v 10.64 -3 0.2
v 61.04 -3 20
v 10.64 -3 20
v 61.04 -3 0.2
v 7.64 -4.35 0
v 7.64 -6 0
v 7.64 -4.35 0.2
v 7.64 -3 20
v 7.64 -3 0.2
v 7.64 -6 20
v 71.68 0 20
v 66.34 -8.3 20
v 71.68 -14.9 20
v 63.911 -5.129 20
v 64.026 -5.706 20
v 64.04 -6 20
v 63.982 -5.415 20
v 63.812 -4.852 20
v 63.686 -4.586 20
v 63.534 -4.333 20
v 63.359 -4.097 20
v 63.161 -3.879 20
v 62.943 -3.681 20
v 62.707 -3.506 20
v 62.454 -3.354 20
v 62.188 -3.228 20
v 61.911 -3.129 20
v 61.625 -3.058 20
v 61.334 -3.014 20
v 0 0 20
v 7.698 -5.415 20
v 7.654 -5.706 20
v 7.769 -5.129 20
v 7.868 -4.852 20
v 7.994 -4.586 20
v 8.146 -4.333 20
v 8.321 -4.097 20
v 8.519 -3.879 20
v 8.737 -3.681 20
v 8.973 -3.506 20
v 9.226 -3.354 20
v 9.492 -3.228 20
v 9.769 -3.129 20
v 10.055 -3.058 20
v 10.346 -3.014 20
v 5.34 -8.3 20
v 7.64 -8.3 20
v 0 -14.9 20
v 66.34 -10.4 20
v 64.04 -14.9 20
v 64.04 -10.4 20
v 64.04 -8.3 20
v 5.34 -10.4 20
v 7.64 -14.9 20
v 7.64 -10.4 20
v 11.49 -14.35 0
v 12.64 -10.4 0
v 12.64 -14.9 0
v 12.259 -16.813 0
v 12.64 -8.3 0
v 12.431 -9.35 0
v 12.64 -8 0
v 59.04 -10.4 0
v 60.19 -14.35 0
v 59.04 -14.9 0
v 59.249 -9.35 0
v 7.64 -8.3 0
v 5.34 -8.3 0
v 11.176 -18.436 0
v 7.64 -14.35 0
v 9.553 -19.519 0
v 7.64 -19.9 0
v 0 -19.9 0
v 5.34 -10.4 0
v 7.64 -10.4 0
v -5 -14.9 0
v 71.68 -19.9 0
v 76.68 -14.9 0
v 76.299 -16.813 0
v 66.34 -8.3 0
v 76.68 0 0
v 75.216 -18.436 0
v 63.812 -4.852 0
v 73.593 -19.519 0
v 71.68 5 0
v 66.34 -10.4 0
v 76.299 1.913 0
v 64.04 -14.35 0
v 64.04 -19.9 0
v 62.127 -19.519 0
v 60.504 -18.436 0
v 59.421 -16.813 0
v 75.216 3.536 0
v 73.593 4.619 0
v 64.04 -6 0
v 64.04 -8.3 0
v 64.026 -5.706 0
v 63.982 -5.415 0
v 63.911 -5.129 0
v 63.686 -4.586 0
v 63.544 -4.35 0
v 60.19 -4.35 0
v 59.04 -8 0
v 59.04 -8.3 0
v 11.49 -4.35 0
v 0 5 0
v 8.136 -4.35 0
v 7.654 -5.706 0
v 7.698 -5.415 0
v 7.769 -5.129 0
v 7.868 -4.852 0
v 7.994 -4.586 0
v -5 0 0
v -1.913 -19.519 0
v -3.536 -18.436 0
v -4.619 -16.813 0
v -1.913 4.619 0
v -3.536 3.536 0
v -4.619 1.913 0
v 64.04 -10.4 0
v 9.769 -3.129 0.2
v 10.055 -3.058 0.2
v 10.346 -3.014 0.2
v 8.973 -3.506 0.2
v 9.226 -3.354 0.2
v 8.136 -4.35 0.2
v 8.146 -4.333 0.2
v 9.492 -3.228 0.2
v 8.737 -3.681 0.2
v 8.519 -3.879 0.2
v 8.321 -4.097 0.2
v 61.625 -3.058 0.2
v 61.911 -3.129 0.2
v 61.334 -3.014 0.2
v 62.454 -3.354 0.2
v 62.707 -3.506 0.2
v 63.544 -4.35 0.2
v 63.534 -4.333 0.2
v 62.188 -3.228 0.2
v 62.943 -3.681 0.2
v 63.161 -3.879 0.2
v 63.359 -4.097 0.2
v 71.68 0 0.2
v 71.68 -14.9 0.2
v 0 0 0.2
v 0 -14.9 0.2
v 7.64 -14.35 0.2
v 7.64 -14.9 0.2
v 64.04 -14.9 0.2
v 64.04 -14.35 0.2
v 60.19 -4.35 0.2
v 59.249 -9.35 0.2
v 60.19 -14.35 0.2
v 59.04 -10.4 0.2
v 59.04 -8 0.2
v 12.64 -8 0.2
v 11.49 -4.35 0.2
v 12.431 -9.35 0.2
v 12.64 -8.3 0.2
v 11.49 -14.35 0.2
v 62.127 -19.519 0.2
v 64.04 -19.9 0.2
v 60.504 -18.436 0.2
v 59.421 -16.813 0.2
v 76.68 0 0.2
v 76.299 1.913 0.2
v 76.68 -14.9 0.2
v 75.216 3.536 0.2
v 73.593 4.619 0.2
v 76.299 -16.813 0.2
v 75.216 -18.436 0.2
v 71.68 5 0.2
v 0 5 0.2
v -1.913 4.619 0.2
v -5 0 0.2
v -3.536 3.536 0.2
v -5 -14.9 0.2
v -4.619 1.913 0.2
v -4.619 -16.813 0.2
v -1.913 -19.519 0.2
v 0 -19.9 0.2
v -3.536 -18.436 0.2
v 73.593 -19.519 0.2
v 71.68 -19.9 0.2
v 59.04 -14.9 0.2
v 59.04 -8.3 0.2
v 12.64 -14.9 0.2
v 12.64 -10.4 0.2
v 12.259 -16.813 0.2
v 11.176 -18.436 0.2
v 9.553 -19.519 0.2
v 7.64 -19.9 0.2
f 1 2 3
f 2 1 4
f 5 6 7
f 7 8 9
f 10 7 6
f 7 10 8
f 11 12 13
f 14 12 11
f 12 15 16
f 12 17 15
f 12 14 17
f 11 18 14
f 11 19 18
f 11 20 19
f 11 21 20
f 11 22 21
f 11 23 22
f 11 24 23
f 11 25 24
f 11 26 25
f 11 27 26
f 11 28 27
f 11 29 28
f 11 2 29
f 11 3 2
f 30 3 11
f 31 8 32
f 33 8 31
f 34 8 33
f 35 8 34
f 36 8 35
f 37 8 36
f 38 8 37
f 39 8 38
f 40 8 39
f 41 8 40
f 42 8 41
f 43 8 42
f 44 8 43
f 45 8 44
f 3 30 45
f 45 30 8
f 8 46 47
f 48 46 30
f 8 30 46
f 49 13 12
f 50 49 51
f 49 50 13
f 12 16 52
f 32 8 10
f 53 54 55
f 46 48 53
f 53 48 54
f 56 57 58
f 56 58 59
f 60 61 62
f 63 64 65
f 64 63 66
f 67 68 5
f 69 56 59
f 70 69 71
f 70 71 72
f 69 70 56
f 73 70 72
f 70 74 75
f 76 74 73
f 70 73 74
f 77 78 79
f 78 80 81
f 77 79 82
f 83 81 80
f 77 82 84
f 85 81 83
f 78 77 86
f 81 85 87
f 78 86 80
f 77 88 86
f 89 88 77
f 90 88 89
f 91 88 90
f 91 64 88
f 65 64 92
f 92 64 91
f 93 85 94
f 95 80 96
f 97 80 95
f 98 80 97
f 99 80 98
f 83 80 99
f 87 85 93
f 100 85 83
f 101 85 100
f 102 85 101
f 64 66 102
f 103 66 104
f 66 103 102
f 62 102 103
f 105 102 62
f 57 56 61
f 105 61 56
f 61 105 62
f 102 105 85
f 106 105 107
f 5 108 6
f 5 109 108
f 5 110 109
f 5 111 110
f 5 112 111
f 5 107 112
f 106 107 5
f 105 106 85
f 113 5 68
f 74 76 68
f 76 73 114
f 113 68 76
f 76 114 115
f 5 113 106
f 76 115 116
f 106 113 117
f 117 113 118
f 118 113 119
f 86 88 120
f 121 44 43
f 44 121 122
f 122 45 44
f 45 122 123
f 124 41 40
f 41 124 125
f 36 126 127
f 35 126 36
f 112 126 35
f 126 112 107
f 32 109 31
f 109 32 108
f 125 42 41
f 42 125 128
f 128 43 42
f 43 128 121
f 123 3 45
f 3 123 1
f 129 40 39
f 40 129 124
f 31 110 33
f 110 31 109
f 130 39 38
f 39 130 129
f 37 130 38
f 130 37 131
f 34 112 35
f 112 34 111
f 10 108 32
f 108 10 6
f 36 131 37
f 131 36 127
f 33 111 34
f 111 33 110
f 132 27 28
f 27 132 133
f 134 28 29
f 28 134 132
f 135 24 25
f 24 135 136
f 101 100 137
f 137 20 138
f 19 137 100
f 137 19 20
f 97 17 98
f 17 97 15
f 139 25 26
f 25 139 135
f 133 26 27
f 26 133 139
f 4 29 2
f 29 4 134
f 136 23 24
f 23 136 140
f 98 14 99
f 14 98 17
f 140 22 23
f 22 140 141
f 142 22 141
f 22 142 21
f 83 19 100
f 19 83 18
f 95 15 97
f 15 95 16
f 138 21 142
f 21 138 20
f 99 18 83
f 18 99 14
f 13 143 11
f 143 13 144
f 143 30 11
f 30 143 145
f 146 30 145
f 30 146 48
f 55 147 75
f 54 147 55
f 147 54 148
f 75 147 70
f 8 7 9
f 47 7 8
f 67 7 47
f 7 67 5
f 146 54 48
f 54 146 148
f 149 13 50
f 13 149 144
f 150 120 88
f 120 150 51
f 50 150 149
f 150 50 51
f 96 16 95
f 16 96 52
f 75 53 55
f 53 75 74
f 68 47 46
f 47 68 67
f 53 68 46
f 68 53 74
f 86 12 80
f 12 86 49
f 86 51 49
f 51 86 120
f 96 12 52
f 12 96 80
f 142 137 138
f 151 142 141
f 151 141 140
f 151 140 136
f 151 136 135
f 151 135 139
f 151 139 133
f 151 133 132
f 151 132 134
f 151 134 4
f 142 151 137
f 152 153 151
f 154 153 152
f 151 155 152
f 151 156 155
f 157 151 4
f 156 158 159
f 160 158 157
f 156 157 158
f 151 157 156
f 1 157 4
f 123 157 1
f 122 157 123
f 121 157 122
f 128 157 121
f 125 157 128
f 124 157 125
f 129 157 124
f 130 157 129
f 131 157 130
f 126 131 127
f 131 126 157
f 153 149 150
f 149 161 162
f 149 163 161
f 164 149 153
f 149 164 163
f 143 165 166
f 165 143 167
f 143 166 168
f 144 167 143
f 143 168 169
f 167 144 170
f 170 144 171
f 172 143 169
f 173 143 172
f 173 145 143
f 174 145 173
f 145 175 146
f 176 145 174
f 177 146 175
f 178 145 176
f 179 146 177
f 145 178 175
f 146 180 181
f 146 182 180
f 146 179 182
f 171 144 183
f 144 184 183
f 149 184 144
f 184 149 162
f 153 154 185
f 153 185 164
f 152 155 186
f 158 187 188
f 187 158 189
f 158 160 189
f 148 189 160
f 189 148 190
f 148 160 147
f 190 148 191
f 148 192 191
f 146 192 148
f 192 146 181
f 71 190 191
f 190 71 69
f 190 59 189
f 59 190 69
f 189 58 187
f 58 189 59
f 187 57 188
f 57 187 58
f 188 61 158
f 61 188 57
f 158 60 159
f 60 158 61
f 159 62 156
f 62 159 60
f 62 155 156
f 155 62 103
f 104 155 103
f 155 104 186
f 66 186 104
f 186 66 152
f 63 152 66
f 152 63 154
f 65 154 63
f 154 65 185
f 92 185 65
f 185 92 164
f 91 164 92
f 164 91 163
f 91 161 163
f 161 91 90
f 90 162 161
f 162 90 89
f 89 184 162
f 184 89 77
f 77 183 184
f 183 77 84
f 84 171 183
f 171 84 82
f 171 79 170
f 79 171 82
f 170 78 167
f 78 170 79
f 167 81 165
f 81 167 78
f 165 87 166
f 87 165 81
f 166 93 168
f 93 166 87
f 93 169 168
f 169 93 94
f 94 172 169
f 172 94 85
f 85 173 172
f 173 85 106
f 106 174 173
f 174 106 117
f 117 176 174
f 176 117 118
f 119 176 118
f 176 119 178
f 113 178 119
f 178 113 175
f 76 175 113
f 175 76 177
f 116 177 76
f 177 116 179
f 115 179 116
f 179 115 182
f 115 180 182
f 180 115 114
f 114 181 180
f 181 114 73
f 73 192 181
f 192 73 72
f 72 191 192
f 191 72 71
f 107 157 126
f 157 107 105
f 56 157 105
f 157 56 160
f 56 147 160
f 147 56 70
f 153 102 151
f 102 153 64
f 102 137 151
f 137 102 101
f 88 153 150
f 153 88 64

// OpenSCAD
// file: ../bracket_lib.scad
// Shared U-bracket holding a PCB in a slot in each upright. All sizes in mm.
// Part files load this with: use <bracket_lib.scad>
//
// Print settings (Ultimaker Cura, PLA, 0.4 mm nozzle), tuned for strength, not looks.
// Cura profile: BracketStrong.curaprofile
//   Orientation       On its side: U-profile flat on the plate, depth upward.
//                     bracket_printable() already rotates it this way.
//                     Layers then run across the uprights, not up them. No supports needed.
//   Layer Height      0.2 mm (thicker layers bond better than fine ones)
//   Wall Line Count   5 (walls carry most of the load; 2 mm shell each side)
//   Top/Bottom        1.2 mm
//   Infill            40 %, Gyroid (strong in all directions)
//   Printing Temp     +5..10 °C over your normal PLA profile, for better layer bonding
//   Fan Speed         reduce to ~50 %, same reason
//   Adhesion          Skirt. The 5 mm brim is part of the model (bracket_printable),
//                     because Cura cannot leave the brim out at the slot mouths.

// Concave fillet along Y, filling the corner at the origin towards +X and +Z.
module fillet(r, depth) {
    difference() {
        cube([r, depth, r]);
        translate([r, -1, r]) rotate([-90, 0, 0]) cylinder(r = r, h = depth + 2, $fn = 64);
    }
}

// slot_span:  distance between slot bottoms = PCB width + clearance (critical)
// depth:      along Y; height: top of uprights; base: floor thickness
// wall:       upright thickness
// slot_z:     bottom of slot from floor underside; slot_h: slot height
// slot_depth: how far the slot cuts into the upright, from the inside
// fillet_r:   inside corner floor/upright, 0 for none; keep below slot_z - base
// slot_flare: extra slot height at the slot bottom, tapering to 0 at the mouth. Narrow slots
//             print as a wedge (the nozzle turn at the closed end overfills it); this compensates.
function bracket_length(slot_span, wall, slot_depth) = slot_span - 2 * slot_depth + 2 * wall;

module bracket(slot_span, depth, height, base, wall, slot_z, slot_h, slot_depth, fillet_r, slot_flare = 0) {
    length = bracket_length(slot_span, wall, slot_depth);
    echo(length = length);
    difference() {
        union() {
            cube([length, depth, base]);                       // floor
            cube([wall, depth, height]);                       // left upright
            translate([length - wall, 0, 0]) cube([wall, depth, height]);  // right upright
            if (fillet_r > 0) {
                translate([wall, 0, base]) fillet(fillet_r, depth);
                translate([length - wall, 0, base]) mirror([1, 0, 0]) fillet(fillet_r, depth);
            }
        }
        // slots, cut from the inside face; 0.01 overlap avoids zero-thickness skins
        for (m = [0, 1])
            translate([m * length, 0, 0]) mirror([m, 0, 0])
                translate([0, depth + 1, 0]) rotate([90, 0, 0]) linear_extrude(depth + 2)
                    polygon([[wall - slot_depth, slot_z - slot_flare / 2], [wall + 0.01, slot_z],
                             [wall + 0.01, slot_z + slot_h], [wall - slot_depth, slot_z + slot_h + slot_flare / 2]]);
    }
}

// Same bracket, rotated into print orientation (on its side), with a one-layer brim
// that keeps brim_keepout clear around each slot mouth so it cannot fill the slot.
// brim_w = 0 for no brim.
module bracket_printable(slot_span, depth, height, base, wall, slot_z, slot_h, slot_depth, fillet_r,
                         slot_flare = 0, brim_w = 5, brim_keepout = 5, brim_h = 0.2) {
    module part() rotate([90, 0, 0])
        bracket(slot_span, depth, height, base, wall, slot_z, slot_h, slot_depth, fillet_r, slot_flare);
    length = bracket_length(slot_span, wall, slot_depth);
    part();
    if (brim_w > 0)
        linear_extrude(brim_h) difference() {
            offset(r = brim_w) projection(cut = true) translate([0, 0, -0.1]) part();
            // printed orientation: original z becomes -y
            for (x = [wall - slot_depth / 2, length - wall + slot_depth / 2])
                translate([x, -(slot_z + slot_h / 2)]) square(2 * brim_keepout, center = true);
        }
}
// main file
// SVB power supply bracket. Print settings: see bracket_lib.scad.
use <../bracket_lib.scad>

slot_span  = 61;    // slot bottoms: PCB 60.0 + 0.5 play + 0.3 lost in print (60.3 printed as 60.0)
depth      = 20;
height     = 14.9;
base       = 3;
wall       = 7.64;
slot_z     = 8.3;
slot_h     = 2.1;   // PCB 1.6 + 0.15 play + 0.35 lost in print (1.8 printed as 1.45)
slot_depth = 2.3;
fillet_r   = 3;

bracket_printable(slot_span, depth, height, base, wall, slot_z, slot_h, slot_depth, fillet_r);
